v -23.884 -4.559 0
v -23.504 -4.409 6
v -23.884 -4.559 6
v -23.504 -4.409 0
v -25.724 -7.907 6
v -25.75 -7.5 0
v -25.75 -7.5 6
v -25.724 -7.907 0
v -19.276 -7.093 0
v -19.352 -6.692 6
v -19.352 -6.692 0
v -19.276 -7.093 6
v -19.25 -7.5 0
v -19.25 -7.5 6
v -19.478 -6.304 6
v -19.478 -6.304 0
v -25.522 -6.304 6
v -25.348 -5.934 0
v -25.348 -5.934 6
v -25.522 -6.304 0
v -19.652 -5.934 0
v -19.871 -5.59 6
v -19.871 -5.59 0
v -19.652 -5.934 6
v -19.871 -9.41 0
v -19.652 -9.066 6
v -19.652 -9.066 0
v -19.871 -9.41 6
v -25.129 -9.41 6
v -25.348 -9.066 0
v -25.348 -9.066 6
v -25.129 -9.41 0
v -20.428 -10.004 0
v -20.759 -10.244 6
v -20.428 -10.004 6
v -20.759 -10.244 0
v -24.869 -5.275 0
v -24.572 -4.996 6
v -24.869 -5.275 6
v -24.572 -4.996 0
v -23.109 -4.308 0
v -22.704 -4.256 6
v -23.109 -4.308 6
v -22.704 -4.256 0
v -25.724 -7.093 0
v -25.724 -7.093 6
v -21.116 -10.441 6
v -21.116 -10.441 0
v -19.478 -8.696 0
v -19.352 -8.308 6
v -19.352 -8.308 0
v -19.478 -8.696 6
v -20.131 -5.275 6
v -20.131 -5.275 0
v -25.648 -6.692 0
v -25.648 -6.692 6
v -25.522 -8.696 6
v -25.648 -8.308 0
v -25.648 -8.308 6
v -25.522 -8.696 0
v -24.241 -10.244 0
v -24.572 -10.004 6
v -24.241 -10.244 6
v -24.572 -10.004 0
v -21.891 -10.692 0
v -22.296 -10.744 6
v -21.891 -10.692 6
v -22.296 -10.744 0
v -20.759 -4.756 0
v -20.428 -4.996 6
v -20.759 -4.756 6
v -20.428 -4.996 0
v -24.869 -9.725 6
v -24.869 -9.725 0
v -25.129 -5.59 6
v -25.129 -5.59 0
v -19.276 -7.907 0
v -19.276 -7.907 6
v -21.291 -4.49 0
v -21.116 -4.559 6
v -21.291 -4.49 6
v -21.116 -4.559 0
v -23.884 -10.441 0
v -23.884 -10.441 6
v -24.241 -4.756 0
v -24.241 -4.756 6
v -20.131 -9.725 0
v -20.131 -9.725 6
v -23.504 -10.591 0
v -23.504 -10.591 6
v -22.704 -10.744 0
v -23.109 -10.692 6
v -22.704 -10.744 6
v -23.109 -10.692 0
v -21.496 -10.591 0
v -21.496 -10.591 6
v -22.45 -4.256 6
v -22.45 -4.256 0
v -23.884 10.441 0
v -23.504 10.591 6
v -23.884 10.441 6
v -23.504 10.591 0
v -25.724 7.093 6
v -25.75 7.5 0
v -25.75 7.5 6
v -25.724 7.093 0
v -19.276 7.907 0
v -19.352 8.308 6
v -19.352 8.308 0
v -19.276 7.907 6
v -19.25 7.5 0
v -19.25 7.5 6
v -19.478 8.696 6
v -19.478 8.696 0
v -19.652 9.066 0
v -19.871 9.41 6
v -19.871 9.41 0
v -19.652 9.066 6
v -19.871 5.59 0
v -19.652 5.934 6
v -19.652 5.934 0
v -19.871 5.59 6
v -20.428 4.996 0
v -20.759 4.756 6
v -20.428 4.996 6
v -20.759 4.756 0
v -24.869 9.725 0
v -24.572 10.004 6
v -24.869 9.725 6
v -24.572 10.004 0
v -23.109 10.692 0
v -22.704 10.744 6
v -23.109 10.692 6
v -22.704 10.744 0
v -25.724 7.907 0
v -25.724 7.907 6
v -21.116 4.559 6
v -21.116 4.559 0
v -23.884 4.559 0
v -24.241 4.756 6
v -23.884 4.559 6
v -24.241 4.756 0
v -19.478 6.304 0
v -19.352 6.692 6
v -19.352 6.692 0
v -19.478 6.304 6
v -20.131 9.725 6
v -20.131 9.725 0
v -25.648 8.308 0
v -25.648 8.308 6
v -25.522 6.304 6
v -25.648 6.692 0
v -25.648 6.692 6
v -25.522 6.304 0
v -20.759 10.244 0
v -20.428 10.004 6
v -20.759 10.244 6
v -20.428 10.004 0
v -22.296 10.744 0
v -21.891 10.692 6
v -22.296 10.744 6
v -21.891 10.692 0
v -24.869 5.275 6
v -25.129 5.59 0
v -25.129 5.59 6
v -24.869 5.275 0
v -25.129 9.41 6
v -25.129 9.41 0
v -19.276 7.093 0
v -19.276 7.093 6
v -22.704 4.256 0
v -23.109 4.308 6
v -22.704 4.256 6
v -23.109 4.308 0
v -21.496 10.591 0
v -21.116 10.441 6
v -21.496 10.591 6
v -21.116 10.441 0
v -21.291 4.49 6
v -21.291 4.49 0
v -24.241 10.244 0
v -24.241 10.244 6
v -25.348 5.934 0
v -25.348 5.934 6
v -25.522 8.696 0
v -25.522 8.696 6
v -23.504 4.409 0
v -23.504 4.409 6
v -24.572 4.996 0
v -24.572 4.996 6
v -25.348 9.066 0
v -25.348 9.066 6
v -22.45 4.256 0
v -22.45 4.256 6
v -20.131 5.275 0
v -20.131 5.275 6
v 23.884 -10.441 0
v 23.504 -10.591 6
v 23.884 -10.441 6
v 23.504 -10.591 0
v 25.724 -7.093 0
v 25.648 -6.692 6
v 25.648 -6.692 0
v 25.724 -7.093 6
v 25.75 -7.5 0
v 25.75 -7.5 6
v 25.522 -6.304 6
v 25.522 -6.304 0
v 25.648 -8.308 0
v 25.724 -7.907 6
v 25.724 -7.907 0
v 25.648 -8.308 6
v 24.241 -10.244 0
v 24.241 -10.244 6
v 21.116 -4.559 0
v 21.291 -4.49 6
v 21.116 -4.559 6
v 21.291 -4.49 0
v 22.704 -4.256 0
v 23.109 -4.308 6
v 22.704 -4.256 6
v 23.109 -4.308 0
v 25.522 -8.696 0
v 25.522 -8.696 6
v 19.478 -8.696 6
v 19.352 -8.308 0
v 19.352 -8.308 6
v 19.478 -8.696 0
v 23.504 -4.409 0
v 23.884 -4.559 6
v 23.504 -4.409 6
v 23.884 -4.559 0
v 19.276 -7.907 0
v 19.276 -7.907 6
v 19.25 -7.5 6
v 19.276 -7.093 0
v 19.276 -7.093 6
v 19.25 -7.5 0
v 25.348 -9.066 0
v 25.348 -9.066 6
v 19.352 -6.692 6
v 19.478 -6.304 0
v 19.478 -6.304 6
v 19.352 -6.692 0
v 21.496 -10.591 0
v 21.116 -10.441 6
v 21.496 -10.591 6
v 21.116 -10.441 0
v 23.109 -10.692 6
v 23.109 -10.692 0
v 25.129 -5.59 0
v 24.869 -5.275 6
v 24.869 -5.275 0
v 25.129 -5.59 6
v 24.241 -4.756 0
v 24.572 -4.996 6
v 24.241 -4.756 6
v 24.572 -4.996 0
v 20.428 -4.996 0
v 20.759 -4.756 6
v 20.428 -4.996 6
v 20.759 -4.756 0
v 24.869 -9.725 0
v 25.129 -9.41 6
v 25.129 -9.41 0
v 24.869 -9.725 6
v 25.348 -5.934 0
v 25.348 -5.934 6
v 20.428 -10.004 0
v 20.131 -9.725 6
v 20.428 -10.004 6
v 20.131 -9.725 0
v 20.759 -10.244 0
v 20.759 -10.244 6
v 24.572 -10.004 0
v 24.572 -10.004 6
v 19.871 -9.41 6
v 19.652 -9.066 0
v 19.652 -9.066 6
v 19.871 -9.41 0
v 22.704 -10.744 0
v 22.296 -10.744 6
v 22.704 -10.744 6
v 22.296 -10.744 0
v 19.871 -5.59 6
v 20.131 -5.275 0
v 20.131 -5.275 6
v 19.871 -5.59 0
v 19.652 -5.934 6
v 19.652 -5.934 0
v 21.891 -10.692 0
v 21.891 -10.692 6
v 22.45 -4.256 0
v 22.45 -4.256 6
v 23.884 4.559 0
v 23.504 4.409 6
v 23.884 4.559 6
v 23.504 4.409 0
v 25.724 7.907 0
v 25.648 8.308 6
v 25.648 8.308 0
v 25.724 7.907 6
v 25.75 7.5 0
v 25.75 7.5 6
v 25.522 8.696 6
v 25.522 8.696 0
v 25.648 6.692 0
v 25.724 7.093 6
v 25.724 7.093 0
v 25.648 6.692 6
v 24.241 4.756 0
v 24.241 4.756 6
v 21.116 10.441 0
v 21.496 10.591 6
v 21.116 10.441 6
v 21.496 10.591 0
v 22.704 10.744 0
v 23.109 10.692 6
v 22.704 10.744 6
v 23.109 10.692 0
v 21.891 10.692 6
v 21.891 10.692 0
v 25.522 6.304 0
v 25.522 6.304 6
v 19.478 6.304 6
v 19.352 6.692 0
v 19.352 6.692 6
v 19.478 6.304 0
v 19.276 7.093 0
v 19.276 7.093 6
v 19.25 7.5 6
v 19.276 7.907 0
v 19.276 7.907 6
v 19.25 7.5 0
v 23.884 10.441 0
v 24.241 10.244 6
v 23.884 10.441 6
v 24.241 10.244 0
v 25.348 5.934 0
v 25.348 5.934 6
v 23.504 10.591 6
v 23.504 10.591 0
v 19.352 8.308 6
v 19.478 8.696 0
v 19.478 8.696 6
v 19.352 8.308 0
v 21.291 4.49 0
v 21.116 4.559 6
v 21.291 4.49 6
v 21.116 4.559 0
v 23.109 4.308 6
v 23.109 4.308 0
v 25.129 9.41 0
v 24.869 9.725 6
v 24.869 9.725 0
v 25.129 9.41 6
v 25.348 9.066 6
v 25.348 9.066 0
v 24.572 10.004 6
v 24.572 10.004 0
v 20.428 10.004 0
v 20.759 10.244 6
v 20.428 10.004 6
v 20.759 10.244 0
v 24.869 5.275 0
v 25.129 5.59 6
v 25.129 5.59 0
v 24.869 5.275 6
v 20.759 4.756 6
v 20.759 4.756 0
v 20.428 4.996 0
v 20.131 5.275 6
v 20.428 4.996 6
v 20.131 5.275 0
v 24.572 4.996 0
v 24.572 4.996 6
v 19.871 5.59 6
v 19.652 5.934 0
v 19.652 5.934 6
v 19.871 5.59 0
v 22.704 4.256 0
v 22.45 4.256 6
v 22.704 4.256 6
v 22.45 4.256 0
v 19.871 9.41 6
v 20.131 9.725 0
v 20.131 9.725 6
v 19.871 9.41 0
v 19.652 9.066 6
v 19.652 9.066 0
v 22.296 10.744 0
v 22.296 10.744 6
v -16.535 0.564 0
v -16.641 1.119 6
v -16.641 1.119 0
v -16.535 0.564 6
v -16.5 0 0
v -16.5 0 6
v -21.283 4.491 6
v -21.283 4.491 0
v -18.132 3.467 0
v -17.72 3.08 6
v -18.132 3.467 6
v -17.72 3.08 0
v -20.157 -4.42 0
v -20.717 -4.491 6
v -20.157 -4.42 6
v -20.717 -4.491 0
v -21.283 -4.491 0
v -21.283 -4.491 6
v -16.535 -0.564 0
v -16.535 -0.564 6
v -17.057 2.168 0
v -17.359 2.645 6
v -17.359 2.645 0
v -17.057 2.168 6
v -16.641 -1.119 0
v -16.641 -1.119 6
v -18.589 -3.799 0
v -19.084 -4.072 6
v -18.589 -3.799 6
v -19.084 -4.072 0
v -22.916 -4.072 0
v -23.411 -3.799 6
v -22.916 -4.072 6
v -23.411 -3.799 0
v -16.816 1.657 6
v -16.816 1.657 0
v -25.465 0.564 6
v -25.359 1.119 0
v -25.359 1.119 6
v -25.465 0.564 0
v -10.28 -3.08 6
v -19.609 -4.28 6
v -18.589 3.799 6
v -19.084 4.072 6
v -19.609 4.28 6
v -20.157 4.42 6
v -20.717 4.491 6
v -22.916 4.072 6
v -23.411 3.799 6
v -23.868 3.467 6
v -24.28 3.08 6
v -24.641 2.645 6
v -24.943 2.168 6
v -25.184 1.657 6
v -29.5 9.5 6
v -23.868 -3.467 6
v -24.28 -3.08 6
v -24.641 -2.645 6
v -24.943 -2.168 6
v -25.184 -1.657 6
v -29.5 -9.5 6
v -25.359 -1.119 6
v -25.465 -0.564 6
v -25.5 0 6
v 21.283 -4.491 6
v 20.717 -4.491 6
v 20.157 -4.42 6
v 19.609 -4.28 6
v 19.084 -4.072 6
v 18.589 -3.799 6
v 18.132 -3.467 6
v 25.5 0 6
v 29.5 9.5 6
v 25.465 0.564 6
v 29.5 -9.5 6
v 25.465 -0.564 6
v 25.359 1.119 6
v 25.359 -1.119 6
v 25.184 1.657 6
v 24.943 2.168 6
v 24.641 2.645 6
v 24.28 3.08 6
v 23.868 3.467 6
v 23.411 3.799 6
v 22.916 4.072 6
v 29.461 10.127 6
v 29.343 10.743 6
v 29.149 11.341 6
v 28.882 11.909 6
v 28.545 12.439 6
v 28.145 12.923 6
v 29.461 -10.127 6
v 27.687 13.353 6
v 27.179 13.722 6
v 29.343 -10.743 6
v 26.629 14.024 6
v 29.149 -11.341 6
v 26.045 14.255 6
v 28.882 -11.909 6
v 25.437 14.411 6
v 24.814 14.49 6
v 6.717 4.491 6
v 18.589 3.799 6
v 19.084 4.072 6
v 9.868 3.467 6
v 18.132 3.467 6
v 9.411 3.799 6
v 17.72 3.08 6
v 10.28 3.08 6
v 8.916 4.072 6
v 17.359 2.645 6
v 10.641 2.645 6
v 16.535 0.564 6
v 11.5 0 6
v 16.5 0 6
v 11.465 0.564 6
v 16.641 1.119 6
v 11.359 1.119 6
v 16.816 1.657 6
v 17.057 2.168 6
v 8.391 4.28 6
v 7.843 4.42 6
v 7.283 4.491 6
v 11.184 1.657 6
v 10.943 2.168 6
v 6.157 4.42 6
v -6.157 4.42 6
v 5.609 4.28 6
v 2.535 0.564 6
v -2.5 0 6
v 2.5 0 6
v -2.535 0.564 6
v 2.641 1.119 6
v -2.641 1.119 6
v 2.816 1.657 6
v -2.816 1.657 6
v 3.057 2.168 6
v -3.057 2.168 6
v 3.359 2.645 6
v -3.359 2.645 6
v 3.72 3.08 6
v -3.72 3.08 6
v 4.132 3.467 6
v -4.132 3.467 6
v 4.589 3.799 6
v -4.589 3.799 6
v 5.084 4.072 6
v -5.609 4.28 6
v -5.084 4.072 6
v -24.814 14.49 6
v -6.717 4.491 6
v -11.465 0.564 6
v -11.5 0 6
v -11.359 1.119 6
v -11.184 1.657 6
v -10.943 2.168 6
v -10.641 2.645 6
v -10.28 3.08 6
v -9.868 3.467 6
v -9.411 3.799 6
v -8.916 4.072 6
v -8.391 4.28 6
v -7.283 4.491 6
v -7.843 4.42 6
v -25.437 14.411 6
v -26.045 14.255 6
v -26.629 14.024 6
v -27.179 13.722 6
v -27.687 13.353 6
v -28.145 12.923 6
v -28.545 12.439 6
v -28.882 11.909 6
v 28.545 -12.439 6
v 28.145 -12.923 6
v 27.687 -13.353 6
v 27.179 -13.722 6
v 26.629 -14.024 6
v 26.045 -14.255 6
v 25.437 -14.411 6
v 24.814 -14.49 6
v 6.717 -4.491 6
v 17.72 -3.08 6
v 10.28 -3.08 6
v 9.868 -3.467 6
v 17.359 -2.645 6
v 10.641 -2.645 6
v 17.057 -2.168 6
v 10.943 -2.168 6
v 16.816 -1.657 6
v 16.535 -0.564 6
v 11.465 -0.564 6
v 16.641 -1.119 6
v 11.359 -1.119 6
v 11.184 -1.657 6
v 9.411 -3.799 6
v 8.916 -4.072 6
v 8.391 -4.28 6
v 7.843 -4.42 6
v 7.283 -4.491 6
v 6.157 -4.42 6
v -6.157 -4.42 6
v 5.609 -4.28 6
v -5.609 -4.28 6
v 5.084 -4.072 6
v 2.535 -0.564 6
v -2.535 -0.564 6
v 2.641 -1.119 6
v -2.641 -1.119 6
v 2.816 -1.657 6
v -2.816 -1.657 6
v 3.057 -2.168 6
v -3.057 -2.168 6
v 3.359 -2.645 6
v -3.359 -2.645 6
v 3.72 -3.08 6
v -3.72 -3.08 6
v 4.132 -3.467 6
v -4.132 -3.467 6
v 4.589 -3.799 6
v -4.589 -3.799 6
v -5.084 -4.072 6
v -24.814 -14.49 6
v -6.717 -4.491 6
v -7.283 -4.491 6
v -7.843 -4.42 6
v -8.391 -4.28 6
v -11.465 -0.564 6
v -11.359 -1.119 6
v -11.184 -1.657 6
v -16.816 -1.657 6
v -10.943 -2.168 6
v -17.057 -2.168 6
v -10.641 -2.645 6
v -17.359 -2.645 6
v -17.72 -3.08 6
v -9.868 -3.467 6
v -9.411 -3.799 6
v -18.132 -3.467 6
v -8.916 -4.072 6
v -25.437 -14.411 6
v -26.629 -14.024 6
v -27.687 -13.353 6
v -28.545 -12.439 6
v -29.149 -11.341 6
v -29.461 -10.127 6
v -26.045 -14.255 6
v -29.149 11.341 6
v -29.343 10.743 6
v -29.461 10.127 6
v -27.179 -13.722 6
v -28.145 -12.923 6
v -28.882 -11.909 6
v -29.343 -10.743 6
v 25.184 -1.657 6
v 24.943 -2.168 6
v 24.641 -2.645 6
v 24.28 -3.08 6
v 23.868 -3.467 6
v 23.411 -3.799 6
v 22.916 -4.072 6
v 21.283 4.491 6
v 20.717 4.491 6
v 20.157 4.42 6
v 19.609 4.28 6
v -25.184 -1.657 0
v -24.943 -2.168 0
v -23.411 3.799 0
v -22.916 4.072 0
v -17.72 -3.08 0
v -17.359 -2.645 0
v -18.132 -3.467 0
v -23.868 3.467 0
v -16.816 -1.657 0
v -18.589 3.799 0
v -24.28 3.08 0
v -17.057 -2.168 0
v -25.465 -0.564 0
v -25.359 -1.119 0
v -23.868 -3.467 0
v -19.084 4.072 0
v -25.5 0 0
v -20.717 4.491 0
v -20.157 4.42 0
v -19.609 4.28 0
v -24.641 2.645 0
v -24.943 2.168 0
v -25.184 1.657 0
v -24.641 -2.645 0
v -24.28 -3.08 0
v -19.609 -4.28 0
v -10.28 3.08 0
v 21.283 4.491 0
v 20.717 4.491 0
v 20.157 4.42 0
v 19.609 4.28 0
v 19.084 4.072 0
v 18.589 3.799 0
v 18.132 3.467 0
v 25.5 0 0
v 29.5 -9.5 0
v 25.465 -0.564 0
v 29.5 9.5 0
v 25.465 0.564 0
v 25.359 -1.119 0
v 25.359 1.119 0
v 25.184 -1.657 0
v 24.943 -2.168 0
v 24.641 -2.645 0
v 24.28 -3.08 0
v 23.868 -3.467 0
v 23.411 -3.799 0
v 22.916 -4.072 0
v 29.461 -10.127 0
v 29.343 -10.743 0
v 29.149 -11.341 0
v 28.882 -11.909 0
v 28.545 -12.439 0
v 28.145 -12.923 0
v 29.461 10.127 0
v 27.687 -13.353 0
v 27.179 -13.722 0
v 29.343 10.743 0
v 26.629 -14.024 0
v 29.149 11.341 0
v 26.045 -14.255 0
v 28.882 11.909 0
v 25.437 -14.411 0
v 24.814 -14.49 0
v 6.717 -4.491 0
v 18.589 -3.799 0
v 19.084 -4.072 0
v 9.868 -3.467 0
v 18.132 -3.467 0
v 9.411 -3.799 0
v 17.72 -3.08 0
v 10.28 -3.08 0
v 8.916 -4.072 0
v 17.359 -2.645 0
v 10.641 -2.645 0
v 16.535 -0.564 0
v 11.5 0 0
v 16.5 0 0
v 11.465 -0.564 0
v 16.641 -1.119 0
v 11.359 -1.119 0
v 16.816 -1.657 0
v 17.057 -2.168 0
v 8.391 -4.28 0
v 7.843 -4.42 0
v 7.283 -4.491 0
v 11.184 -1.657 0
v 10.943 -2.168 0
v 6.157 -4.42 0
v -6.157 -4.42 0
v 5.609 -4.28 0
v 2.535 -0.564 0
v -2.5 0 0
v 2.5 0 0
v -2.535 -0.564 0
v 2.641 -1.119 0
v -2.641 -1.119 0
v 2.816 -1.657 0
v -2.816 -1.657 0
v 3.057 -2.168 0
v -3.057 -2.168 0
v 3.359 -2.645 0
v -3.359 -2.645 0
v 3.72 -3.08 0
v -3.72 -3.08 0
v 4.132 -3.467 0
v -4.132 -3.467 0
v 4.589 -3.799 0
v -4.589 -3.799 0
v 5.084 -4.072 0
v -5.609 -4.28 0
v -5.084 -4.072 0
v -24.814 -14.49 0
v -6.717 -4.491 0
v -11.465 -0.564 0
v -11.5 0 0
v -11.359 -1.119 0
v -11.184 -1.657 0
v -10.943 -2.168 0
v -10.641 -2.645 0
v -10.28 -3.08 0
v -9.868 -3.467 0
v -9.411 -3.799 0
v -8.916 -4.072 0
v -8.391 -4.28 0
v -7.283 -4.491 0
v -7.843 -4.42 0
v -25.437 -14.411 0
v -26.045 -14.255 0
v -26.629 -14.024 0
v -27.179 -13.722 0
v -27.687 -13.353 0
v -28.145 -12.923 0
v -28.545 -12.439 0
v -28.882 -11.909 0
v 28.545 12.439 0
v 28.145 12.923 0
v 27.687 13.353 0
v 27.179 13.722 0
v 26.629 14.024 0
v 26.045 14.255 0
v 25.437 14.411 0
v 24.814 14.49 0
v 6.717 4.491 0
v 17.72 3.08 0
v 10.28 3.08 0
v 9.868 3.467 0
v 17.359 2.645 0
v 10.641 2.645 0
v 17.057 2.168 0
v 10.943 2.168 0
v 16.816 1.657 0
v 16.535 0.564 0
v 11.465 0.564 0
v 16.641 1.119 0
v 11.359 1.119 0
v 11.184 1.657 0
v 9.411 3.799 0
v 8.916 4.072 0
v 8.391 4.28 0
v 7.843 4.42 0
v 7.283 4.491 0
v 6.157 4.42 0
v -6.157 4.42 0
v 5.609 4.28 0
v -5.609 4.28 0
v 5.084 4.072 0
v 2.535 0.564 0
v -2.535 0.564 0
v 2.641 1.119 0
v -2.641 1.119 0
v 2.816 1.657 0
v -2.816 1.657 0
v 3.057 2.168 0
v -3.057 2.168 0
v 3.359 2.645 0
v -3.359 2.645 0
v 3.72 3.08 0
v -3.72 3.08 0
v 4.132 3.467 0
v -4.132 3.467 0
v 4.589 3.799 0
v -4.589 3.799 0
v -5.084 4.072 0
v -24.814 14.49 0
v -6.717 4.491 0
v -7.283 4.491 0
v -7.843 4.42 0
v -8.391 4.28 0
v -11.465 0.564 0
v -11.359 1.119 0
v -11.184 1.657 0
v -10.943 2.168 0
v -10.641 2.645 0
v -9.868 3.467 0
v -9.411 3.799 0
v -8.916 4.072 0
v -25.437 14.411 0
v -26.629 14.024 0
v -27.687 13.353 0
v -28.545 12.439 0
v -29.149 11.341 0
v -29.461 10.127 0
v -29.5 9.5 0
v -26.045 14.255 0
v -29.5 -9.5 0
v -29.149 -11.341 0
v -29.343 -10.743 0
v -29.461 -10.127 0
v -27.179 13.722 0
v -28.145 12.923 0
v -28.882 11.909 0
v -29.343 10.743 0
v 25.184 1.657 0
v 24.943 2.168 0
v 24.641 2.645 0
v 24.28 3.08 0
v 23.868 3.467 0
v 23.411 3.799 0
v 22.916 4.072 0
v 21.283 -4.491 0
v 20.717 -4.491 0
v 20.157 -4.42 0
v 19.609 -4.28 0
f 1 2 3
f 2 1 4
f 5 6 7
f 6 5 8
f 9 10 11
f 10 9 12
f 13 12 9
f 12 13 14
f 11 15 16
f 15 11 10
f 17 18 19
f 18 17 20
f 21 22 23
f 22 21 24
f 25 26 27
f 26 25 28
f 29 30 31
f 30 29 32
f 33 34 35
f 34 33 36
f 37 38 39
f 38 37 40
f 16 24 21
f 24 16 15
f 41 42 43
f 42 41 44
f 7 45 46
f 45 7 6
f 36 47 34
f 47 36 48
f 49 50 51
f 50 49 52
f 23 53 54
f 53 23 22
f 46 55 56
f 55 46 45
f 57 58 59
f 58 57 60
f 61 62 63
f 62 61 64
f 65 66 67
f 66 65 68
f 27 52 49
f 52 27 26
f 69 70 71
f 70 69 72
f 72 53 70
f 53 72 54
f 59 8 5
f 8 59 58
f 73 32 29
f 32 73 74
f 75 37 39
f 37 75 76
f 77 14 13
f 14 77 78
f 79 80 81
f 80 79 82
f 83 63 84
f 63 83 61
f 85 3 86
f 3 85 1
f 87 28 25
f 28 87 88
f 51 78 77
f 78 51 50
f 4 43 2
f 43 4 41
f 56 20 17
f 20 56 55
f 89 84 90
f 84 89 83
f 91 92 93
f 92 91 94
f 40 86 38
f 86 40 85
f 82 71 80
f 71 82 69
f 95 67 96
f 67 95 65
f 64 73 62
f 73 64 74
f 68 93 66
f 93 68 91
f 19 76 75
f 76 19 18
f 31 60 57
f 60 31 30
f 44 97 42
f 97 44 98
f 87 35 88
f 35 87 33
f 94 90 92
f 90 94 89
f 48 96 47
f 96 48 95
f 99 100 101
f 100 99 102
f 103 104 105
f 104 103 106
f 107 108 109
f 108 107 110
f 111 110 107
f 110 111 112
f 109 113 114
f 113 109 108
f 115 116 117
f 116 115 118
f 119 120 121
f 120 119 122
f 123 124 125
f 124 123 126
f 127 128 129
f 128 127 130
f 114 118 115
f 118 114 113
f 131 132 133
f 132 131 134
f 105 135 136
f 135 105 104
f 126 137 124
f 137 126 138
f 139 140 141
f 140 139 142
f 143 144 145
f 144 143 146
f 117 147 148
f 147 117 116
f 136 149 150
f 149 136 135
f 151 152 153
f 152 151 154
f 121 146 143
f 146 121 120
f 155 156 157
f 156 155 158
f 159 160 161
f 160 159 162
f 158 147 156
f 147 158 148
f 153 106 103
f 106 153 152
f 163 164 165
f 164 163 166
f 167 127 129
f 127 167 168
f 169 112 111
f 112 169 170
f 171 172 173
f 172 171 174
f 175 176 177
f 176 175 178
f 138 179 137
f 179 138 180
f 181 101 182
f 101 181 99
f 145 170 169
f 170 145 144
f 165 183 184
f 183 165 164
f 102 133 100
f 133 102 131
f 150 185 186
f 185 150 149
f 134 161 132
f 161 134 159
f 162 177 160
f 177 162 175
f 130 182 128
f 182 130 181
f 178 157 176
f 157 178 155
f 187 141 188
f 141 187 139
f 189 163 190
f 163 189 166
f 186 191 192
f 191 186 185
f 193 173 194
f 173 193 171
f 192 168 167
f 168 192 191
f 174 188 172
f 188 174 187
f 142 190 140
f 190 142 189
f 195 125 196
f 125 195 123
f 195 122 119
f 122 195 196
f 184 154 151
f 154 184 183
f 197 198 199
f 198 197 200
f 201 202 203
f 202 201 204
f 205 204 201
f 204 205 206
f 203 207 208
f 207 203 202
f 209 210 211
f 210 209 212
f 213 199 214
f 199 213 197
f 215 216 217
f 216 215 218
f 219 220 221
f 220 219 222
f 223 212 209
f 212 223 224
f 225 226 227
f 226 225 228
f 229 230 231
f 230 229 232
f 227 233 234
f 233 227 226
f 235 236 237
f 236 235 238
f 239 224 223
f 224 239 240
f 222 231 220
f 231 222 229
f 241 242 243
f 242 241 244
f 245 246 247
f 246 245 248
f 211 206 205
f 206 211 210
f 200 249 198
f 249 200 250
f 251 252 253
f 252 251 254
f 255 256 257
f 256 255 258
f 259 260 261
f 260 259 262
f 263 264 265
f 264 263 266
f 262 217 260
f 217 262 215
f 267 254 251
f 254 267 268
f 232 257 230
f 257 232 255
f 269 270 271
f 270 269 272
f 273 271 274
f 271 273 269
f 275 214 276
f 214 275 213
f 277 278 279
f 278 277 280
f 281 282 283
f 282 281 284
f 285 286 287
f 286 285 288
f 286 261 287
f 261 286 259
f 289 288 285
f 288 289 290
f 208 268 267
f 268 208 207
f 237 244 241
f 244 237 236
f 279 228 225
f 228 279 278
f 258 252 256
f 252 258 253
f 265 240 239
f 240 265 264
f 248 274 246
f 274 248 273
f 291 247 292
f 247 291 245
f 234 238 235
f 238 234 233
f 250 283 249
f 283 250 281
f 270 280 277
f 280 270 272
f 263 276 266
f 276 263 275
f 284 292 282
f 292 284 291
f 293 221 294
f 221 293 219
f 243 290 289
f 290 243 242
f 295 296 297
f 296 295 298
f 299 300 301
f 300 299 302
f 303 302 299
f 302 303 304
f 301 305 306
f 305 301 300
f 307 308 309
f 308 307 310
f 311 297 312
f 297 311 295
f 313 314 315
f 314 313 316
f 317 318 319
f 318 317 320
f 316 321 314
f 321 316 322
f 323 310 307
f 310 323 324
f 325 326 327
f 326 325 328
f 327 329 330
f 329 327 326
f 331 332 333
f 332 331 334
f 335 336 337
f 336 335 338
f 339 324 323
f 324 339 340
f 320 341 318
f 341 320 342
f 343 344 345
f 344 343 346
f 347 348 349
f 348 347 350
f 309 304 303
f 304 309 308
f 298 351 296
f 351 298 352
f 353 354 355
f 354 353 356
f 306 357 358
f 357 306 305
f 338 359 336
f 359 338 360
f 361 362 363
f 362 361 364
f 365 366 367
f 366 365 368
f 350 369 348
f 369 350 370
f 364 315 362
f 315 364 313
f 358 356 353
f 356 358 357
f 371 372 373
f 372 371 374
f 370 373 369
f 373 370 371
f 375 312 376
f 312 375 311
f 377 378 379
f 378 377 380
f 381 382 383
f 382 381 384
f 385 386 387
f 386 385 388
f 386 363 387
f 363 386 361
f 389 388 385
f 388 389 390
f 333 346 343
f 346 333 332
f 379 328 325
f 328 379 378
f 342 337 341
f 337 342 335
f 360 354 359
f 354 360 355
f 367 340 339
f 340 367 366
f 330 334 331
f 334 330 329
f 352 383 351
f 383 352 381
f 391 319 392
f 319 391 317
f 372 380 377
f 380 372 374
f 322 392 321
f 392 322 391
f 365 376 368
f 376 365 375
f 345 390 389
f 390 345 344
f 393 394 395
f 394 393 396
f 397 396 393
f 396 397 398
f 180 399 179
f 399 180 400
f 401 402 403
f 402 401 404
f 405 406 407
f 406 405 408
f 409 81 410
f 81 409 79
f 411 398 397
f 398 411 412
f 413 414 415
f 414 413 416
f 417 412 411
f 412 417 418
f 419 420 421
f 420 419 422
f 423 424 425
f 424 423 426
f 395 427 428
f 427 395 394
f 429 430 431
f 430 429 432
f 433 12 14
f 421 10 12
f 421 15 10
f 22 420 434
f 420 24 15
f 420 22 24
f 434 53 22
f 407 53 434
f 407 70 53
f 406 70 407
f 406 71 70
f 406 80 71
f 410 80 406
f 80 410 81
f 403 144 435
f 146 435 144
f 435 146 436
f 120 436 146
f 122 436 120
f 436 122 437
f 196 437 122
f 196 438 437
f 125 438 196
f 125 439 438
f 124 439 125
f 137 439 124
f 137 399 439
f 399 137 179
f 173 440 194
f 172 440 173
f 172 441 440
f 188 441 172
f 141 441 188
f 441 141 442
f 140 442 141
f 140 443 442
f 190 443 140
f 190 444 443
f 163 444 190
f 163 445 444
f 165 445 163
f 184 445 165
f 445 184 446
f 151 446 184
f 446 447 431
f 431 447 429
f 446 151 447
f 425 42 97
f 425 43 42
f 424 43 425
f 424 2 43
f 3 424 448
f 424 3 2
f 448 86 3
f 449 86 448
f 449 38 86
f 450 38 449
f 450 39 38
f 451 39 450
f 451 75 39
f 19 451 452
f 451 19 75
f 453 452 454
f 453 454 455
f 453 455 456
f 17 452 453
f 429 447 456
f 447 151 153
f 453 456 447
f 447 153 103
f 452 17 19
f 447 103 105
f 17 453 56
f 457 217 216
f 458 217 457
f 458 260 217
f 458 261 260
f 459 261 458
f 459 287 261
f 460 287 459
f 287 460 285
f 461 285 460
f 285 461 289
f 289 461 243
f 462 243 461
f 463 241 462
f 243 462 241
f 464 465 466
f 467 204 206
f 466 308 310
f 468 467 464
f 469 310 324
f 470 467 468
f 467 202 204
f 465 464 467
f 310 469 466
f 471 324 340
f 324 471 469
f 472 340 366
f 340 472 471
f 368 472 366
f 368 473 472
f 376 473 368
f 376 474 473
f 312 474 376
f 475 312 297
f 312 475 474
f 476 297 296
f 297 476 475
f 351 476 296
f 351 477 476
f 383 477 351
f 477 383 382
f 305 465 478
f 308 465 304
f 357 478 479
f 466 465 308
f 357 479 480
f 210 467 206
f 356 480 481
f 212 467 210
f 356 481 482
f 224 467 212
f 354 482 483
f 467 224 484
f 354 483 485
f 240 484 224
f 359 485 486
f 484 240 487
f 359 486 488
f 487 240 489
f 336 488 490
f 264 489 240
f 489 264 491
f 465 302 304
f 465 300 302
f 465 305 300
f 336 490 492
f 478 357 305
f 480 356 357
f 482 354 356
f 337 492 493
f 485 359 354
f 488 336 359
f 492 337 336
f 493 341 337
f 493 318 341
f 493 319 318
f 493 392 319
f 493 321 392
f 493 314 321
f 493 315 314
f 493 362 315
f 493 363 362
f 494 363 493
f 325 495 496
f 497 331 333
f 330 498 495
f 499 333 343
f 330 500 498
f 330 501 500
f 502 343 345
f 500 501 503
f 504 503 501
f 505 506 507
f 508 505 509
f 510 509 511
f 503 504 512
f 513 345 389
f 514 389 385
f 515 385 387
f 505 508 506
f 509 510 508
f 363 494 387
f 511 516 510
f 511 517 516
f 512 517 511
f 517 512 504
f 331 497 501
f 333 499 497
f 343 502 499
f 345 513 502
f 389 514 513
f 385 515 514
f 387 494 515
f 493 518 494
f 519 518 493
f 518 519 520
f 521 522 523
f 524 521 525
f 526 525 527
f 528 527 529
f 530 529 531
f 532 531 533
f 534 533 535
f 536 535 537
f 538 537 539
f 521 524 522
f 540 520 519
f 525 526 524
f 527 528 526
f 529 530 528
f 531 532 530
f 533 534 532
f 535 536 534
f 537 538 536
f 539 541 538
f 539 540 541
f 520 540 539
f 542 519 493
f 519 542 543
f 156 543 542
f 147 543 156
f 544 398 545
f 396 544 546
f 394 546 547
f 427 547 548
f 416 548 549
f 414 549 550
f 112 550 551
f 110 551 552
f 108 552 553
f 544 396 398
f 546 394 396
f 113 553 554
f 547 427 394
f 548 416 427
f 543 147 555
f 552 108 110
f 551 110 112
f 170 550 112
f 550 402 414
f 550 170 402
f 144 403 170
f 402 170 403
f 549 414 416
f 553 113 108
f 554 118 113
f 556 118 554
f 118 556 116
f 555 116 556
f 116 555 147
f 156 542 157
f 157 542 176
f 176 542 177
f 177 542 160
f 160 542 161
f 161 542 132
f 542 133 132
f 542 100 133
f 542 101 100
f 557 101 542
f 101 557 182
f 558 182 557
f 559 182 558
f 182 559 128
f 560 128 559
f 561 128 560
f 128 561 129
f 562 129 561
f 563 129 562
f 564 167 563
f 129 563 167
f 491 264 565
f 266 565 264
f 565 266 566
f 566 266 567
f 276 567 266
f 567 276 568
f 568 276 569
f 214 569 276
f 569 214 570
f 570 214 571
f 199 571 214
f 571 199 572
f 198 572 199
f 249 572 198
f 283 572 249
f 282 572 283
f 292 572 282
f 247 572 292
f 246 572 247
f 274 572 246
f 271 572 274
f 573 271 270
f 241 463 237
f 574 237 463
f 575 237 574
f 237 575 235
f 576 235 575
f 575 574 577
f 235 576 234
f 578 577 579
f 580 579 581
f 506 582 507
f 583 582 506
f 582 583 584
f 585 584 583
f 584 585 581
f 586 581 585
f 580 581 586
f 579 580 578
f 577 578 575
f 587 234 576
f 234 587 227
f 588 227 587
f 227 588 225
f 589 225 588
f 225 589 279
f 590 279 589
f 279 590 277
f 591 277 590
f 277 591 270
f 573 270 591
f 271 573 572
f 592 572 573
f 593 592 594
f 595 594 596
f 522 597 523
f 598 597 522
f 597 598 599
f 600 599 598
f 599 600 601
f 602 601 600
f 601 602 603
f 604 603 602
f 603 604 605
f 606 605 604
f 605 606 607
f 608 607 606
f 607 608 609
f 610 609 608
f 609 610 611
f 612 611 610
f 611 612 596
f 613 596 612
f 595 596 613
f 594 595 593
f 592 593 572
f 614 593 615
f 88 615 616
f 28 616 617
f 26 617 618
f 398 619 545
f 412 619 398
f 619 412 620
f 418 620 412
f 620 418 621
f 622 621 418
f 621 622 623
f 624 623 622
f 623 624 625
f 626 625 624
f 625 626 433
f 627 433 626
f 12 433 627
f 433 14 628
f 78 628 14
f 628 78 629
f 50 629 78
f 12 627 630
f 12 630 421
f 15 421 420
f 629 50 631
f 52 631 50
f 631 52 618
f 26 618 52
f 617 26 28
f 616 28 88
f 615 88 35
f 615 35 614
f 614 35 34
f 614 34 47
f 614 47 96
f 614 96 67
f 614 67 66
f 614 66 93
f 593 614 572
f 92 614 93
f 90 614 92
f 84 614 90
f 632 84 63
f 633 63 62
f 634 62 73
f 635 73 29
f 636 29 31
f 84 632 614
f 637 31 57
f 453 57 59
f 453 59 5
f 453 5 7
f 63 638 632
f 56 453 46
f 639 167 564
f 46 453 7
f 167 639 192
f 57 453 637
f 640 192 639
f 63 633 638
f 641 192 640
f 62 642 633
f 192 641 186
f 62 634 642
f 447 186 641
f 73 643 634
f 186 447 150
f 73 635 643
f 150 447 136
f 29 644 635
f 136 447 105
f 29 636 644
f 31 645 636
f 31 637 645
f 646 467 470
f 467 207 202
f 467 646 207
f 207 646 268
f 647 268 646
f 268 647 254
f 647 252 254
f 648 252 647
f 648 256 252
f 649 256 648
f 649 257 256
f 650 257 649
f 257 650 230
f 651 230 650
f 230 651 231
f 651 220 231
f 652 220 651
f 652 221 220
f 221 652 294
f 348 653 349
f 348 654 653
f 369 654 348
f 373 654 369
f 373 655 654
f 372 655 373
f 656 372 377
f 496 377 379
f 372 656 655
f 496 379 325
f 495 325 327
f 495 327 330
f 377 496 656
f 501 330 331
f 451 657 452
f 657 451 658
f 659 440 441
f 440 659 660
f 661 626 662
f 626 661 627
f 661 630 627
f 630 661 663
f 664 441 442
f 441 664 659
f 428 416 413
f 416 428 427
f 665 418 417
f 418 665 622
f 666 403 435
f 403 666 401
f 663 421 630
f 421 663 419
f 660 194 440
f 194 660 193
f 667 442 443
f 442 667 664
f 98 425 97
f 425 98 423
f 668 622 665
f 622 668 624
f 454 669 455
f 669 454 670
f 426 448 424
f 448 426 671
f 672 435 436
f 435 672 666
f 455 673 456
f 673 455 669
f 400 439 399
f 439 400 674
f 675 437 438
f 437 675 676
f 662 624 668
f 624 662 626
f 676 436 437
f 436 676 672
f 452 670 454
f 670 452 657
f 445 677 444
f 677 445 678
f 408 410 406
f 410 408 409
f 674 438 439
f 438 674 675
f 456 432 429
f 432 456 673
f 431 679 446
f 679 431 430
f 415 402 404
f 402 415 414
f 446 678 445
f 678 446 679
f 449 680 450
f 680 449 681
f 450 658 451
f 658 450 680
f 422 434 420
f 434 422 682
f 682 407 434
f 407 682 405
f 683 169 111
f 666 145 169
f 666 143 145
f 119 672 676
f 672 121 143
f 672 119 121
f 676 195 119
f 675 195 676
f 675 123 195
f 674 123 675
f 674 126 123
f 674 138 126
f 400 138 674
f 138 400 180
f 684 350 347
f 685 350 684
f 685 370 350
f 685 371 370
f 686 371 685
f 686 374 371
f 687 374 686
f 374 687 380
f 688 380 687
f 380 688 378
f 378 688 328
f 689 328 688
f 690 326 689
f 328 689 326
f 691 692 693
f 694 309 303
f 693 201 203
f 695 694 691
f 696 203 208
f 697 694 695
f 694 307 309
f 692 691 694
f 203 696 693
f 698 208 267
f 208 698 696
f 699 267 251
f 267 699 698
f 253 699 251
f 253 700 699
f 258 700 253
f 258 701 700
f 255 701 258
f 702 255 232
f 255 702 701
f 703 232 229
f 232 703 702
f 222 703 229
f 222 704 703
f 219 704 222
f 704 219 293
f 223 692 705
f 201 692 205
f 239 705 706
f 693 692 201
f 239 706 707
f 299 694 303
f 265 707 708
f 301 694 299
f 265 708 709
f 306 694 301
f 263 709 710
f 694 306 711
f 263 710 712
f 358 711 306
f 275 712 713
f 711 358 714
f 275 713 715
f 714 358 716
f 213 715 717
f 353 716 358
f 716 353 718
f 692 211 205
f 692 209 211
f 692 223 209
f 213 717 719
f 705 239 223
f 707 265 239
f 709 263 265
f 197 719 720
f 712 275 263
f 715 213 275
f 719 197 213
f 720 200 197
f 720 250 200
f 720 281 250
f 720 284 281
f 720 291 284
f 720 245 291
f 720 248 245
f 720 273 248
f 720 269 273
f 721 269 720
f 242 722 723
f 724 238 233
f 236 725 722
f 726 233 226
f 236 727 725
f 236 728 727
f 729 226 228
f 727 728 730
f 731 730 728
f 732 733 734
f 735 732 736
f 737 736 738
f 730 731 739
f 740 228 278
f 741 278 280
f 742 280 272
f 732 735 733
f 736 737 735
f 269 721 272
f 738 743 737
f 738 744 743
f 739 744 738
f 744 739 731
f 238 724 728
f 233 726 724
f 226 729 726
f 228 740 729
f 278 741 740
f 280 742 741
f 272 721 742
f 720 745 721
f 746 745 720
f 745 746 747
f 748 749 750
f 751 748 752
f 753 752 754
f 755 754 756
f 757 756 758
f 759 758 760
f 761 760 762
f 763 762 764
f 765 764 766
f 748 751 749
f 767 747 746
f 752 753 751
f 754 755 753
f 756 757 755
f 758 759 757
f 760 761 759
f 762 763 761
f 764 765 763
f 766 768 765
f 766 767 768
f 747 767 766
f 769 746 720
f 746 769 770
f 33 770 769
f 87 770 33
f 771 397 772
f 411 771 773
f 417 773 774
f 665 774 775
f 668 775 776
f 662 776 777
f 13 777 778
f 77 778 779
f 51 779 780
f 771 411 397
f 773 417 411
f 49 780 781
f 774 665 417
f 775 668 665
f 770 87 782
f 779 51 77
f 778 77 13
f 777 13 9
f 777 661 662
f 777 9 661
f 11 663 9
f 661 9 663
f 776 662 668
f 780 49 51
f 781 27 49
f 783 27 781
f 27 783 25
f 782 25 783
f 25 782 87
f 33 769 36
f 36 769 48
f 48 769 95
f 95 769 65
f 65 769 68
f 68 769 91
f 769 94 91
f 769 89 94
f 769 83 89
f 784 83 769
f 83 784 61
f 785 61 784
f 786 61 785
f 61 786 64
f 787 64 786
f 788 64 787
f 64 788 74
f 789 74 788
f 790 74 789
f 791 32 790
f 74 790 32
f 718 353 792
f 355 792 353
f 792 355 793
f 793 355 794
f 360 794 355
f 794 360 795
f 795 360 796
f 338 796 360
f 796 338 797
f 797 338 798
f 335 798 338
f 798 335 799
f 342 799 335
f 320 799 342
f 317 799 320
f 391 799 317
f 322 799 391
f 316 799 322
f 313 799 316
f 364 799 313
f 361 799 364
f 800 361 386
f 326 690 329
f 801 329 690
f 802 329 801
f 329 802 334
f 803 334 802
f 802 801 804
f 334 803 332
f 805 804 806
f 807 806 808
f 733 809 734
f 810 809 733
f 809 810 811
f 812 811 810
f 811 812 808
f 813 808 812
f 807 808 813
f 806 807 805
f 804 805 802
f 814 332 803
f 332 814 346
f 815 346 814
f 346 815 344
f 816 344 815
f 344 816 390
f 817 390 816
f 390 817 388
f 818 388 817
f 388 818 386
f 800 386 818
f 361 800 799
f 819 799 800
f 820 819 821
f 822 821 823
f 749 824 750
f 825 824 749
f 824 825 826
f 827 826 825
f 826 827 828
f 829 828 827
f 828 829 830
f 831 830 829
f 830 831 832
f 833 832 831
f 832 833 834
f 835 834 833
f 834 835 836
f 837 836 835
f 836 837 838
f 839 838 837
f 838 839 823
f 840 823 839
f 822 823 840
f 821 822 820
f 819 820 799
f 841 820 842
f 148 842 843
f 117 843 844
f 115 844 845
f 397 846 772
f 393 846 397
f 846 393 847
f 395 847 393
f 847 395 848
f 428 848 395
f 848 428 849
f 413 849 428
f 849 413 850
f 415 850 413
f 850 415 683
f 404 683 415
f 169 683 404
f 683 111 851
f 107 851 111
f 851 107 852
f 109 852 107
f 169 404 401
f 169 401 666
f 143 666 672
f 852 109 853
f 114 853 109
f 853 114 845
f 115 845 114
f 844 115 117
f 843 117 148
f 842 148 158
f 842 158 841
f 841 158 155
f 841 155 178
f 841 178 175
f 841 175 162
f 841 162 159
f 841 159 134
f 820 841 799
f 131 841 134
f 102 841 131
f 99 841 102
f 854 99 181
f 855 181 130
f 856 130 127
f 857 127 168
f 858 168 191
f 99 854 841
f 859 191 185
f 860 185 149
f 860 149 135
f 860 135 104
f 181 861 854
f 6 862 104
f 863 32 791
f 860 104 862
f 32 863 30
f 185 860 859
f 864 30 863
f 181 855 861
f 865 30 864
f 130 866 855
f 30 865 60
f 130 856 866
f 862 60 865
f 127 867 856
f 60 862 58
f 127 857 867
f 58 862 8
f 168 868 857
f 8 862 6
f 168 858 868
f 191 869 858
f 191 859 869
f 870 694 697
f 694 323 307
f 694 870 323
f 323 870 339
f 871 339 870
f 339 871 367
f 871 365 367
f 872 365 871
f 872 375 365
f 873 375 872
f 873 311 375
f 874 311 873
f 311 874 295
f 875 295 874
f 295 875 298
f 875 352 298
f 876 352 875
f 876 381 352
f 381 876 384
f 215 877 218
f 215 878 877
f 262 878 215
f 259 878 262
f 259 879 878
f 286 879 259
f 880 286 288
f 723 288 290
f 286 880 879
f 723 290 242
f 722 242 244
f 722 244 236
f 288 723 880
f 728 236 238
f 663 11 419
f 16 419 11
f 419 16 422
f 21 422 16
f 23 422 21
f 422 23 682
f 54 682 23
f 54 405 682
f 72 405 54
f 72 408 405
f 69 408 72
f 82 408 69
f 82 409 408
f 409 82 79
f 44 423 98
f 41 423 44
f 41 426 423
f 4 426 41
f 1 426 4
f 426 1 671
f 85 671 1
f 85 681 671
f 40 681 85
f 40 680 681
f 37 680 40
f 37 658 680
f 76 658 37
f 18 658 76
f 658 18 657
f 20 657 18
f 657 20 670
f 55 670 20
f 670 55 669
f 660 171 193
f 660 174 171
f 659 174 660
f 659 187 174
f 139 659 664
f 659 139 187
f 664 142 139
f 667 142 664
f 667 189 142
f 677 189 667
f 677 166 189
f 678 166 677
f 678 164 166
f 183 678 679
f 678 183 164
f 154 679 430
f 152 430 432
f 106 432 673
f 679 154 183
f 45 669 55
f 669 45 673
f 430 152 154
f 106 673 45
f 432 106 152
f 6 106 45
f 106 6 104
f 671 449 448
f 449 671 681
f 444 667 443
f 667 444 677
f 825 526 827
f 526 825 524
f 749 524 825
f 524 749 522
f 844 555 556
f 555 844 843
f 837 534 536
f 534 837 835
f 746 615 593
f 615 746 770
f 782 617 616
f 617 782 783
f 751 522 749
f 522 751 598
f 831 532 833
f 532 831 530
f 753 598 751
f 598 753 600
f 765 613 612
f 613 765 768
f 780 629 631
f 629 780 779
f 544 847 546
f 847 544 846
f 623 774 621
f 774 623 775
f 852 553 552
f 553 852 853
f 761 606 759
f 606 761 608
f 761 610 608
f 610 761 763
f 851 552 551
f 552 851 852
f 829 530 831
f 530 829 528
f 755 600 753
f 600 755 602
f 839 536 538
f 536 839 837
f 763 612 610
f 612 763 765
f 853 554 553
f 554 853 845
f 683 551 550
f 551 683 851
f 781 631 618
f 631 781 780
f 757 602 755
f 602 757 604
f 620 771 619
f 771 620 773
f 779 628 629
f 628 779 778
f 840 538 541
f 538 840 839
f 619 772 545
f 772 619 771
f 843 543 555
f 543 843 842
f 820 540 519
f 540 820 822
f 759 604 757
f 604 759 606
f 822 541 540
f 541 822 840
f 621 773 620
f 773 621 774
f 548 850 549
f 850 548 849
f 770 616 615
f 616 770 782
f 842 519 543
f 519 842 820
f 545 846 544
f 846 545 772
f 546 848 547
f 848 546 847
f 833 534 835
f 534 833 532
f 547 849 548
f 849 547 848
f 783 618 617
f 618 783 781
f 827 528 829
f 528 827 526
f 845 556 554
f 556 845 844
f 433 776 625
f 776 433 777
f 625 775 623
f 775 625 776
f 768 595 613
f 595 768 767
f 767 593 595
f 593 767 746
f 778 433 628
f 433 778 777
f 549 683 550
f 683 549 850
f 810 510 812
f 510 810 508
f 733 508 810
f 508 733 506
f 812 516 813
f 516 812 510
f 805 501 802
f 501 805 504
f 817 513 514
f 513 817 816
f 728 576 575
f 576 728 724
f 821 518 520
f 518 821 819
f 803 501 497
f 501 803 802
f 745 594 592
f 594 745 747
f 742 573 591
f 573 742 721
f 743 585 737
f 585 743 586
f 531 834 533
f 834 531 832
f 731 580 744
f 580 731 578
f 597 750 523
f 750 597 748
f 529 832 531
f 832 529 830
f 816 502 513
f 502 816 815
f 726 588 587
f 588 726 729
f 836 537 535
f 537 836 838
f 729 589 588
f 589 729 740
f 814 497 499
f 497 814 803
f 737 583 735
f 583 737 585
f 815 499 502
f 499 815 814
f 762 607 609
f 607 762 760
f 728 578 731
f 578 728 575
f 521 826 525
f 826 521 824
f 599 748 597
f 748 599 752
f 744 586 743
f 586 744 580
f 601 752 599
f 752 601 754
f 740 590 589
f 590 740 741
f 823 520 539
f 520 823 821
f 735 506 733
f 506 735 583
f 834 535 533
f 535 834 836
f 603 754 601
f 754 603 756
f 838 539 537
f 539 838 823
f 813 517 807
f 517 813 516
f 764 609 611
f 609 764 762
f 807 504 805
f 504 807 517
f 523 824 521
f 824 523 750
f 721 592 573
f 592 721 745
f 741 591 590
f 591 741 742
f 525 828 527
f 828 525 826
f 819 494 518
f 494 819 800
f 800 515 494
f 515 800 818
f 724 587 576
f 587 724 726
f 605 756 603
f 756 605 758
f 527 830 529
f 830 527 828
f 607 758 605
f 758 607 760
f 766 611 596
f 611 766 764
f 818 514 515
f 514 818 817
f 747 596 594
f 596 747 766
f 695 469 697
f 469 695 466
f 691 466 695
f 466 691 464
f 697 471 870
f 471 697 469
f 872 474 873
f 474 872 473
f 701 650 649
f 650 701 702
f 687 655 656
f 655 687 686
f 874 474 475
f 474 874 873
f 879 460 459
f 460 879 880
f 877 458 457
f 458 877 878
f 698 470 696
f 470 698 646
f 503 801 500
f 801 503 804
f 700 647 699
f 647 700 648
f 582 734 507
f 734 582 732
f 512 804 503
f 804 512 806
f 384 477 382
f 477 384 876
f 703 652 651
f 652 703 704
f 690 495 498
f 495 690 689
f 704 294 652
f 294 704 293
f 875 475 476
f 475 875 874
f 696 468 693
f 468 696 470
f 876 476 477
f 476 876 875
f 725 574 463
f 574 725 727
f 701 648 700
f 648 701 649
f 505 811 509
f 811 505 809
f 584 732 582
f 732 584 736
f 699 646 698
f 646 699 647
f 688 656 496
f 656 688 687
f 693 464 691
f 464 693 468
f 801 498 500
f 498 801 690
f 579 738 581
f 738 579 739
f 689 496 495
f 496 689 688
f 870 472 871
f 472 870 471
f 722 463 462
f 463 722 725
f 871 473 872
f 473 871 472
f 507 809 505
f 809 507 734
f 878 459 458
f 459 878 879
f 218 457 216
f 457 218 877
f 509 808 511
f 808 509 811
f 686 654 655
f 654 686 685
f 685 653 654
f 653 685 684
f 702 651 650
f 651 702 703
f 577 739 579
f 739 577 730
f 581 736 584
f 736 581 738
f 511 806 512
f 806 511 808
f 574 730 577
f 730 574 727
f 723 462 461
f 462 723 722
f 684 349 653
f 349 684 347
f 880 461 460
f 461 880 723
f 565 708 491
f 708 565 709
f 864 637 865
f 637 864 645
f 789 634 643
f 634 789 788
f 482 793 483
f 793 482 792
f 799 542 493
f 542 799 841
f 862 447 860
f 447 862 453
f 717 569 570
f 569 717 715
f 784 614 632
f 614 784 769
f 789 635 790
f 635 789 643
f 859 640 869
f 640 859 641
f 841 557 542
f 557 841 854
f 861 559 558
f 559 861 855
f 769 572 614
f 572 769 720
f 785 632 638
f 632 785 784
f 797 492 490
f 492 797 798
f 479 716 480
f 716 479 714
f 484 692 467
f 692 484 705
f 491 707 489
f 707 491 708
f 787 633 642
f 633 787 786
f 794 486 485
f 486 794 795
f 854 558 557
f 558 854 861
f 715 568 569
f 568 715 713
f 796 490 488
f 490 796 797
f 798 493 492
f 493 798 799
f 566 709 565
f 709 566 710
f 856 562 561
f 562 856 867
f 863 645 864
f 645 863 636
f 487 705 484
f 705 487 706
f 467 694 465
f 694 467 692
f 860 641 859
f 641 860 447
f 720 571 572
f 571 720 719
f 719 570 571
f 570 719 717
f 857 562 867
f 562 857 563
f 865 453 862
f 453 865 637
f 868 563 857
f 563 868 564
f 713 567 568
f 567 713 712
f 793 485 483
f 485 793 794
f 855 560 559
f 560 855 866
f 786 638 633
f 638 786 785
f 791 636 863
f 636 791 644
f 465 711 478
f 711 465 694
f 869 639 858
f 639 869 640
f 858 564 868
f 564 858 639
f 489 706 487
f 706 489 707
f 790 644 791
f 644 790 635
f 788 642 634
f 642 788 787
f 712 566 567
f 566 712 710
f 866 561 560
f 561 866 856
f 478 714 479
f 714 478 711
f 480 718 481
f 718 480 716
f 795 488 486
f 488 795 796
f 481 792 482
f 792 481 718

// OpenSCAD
$fn = 50;


difference() {
	union() {
		hull() {
			translate(v = [-24.5000000000, 9.5000000000, 0]) {
				cylinder(h = 6, r = 5);
			}
			translate(v = [24.5000000000, 9.5000000000, 0]) {
				cylinder(h = 6, r = 5);
			}
			translate(v = [-24.5000000000, -9.5000000000, 0]) {
				cylinder(h = 6, r = 5);
			}
			translate(v = [24.5000000000, -9.5000000000, 0]) {
				cylinder(h = 6, r = 5);
			}
		}
	}
	union() {
		#translate(v = [-22.5000000000, -7.5000000000, -100.0000000000]) {
			cylinder(h = 200, r = 3.2500000000);
		}
		#translate(v = [-22.5000000000, 7.5000000000, -100.0000000000]) {
			cylinder(h = 200, r = 3.2500000000);
		}
		#translate(v = [22.5000000000, -7.5000000000, -100.0000000000]) {
			cylinder(h = 200, r = 3.2500000000);
		}
		#translate(v = [22.5000000000, 7.5000000000, -100.0000000000]) {
			cylinder(h = 200, r = 3.2500000000);
		}
		#translate(v = [-21.0000000000, 0, 0]) {
			cylinder(h = 6, r = 4.5000000000);
		}
		#translate(v = [-7.0000000000, 0, 0]) {
			cylinder(h = 6, r = 4.5000000000);
		}
		#translate(v = [7.0000000000, 0, 0]) {
			cylinder(h = 6, r = 4.5000000000);
		}
		#translate(v = [21.0000000000, 0, 0]) {
			cylinder(h = 6, r = 4.5000000000);
		}
	}
}
